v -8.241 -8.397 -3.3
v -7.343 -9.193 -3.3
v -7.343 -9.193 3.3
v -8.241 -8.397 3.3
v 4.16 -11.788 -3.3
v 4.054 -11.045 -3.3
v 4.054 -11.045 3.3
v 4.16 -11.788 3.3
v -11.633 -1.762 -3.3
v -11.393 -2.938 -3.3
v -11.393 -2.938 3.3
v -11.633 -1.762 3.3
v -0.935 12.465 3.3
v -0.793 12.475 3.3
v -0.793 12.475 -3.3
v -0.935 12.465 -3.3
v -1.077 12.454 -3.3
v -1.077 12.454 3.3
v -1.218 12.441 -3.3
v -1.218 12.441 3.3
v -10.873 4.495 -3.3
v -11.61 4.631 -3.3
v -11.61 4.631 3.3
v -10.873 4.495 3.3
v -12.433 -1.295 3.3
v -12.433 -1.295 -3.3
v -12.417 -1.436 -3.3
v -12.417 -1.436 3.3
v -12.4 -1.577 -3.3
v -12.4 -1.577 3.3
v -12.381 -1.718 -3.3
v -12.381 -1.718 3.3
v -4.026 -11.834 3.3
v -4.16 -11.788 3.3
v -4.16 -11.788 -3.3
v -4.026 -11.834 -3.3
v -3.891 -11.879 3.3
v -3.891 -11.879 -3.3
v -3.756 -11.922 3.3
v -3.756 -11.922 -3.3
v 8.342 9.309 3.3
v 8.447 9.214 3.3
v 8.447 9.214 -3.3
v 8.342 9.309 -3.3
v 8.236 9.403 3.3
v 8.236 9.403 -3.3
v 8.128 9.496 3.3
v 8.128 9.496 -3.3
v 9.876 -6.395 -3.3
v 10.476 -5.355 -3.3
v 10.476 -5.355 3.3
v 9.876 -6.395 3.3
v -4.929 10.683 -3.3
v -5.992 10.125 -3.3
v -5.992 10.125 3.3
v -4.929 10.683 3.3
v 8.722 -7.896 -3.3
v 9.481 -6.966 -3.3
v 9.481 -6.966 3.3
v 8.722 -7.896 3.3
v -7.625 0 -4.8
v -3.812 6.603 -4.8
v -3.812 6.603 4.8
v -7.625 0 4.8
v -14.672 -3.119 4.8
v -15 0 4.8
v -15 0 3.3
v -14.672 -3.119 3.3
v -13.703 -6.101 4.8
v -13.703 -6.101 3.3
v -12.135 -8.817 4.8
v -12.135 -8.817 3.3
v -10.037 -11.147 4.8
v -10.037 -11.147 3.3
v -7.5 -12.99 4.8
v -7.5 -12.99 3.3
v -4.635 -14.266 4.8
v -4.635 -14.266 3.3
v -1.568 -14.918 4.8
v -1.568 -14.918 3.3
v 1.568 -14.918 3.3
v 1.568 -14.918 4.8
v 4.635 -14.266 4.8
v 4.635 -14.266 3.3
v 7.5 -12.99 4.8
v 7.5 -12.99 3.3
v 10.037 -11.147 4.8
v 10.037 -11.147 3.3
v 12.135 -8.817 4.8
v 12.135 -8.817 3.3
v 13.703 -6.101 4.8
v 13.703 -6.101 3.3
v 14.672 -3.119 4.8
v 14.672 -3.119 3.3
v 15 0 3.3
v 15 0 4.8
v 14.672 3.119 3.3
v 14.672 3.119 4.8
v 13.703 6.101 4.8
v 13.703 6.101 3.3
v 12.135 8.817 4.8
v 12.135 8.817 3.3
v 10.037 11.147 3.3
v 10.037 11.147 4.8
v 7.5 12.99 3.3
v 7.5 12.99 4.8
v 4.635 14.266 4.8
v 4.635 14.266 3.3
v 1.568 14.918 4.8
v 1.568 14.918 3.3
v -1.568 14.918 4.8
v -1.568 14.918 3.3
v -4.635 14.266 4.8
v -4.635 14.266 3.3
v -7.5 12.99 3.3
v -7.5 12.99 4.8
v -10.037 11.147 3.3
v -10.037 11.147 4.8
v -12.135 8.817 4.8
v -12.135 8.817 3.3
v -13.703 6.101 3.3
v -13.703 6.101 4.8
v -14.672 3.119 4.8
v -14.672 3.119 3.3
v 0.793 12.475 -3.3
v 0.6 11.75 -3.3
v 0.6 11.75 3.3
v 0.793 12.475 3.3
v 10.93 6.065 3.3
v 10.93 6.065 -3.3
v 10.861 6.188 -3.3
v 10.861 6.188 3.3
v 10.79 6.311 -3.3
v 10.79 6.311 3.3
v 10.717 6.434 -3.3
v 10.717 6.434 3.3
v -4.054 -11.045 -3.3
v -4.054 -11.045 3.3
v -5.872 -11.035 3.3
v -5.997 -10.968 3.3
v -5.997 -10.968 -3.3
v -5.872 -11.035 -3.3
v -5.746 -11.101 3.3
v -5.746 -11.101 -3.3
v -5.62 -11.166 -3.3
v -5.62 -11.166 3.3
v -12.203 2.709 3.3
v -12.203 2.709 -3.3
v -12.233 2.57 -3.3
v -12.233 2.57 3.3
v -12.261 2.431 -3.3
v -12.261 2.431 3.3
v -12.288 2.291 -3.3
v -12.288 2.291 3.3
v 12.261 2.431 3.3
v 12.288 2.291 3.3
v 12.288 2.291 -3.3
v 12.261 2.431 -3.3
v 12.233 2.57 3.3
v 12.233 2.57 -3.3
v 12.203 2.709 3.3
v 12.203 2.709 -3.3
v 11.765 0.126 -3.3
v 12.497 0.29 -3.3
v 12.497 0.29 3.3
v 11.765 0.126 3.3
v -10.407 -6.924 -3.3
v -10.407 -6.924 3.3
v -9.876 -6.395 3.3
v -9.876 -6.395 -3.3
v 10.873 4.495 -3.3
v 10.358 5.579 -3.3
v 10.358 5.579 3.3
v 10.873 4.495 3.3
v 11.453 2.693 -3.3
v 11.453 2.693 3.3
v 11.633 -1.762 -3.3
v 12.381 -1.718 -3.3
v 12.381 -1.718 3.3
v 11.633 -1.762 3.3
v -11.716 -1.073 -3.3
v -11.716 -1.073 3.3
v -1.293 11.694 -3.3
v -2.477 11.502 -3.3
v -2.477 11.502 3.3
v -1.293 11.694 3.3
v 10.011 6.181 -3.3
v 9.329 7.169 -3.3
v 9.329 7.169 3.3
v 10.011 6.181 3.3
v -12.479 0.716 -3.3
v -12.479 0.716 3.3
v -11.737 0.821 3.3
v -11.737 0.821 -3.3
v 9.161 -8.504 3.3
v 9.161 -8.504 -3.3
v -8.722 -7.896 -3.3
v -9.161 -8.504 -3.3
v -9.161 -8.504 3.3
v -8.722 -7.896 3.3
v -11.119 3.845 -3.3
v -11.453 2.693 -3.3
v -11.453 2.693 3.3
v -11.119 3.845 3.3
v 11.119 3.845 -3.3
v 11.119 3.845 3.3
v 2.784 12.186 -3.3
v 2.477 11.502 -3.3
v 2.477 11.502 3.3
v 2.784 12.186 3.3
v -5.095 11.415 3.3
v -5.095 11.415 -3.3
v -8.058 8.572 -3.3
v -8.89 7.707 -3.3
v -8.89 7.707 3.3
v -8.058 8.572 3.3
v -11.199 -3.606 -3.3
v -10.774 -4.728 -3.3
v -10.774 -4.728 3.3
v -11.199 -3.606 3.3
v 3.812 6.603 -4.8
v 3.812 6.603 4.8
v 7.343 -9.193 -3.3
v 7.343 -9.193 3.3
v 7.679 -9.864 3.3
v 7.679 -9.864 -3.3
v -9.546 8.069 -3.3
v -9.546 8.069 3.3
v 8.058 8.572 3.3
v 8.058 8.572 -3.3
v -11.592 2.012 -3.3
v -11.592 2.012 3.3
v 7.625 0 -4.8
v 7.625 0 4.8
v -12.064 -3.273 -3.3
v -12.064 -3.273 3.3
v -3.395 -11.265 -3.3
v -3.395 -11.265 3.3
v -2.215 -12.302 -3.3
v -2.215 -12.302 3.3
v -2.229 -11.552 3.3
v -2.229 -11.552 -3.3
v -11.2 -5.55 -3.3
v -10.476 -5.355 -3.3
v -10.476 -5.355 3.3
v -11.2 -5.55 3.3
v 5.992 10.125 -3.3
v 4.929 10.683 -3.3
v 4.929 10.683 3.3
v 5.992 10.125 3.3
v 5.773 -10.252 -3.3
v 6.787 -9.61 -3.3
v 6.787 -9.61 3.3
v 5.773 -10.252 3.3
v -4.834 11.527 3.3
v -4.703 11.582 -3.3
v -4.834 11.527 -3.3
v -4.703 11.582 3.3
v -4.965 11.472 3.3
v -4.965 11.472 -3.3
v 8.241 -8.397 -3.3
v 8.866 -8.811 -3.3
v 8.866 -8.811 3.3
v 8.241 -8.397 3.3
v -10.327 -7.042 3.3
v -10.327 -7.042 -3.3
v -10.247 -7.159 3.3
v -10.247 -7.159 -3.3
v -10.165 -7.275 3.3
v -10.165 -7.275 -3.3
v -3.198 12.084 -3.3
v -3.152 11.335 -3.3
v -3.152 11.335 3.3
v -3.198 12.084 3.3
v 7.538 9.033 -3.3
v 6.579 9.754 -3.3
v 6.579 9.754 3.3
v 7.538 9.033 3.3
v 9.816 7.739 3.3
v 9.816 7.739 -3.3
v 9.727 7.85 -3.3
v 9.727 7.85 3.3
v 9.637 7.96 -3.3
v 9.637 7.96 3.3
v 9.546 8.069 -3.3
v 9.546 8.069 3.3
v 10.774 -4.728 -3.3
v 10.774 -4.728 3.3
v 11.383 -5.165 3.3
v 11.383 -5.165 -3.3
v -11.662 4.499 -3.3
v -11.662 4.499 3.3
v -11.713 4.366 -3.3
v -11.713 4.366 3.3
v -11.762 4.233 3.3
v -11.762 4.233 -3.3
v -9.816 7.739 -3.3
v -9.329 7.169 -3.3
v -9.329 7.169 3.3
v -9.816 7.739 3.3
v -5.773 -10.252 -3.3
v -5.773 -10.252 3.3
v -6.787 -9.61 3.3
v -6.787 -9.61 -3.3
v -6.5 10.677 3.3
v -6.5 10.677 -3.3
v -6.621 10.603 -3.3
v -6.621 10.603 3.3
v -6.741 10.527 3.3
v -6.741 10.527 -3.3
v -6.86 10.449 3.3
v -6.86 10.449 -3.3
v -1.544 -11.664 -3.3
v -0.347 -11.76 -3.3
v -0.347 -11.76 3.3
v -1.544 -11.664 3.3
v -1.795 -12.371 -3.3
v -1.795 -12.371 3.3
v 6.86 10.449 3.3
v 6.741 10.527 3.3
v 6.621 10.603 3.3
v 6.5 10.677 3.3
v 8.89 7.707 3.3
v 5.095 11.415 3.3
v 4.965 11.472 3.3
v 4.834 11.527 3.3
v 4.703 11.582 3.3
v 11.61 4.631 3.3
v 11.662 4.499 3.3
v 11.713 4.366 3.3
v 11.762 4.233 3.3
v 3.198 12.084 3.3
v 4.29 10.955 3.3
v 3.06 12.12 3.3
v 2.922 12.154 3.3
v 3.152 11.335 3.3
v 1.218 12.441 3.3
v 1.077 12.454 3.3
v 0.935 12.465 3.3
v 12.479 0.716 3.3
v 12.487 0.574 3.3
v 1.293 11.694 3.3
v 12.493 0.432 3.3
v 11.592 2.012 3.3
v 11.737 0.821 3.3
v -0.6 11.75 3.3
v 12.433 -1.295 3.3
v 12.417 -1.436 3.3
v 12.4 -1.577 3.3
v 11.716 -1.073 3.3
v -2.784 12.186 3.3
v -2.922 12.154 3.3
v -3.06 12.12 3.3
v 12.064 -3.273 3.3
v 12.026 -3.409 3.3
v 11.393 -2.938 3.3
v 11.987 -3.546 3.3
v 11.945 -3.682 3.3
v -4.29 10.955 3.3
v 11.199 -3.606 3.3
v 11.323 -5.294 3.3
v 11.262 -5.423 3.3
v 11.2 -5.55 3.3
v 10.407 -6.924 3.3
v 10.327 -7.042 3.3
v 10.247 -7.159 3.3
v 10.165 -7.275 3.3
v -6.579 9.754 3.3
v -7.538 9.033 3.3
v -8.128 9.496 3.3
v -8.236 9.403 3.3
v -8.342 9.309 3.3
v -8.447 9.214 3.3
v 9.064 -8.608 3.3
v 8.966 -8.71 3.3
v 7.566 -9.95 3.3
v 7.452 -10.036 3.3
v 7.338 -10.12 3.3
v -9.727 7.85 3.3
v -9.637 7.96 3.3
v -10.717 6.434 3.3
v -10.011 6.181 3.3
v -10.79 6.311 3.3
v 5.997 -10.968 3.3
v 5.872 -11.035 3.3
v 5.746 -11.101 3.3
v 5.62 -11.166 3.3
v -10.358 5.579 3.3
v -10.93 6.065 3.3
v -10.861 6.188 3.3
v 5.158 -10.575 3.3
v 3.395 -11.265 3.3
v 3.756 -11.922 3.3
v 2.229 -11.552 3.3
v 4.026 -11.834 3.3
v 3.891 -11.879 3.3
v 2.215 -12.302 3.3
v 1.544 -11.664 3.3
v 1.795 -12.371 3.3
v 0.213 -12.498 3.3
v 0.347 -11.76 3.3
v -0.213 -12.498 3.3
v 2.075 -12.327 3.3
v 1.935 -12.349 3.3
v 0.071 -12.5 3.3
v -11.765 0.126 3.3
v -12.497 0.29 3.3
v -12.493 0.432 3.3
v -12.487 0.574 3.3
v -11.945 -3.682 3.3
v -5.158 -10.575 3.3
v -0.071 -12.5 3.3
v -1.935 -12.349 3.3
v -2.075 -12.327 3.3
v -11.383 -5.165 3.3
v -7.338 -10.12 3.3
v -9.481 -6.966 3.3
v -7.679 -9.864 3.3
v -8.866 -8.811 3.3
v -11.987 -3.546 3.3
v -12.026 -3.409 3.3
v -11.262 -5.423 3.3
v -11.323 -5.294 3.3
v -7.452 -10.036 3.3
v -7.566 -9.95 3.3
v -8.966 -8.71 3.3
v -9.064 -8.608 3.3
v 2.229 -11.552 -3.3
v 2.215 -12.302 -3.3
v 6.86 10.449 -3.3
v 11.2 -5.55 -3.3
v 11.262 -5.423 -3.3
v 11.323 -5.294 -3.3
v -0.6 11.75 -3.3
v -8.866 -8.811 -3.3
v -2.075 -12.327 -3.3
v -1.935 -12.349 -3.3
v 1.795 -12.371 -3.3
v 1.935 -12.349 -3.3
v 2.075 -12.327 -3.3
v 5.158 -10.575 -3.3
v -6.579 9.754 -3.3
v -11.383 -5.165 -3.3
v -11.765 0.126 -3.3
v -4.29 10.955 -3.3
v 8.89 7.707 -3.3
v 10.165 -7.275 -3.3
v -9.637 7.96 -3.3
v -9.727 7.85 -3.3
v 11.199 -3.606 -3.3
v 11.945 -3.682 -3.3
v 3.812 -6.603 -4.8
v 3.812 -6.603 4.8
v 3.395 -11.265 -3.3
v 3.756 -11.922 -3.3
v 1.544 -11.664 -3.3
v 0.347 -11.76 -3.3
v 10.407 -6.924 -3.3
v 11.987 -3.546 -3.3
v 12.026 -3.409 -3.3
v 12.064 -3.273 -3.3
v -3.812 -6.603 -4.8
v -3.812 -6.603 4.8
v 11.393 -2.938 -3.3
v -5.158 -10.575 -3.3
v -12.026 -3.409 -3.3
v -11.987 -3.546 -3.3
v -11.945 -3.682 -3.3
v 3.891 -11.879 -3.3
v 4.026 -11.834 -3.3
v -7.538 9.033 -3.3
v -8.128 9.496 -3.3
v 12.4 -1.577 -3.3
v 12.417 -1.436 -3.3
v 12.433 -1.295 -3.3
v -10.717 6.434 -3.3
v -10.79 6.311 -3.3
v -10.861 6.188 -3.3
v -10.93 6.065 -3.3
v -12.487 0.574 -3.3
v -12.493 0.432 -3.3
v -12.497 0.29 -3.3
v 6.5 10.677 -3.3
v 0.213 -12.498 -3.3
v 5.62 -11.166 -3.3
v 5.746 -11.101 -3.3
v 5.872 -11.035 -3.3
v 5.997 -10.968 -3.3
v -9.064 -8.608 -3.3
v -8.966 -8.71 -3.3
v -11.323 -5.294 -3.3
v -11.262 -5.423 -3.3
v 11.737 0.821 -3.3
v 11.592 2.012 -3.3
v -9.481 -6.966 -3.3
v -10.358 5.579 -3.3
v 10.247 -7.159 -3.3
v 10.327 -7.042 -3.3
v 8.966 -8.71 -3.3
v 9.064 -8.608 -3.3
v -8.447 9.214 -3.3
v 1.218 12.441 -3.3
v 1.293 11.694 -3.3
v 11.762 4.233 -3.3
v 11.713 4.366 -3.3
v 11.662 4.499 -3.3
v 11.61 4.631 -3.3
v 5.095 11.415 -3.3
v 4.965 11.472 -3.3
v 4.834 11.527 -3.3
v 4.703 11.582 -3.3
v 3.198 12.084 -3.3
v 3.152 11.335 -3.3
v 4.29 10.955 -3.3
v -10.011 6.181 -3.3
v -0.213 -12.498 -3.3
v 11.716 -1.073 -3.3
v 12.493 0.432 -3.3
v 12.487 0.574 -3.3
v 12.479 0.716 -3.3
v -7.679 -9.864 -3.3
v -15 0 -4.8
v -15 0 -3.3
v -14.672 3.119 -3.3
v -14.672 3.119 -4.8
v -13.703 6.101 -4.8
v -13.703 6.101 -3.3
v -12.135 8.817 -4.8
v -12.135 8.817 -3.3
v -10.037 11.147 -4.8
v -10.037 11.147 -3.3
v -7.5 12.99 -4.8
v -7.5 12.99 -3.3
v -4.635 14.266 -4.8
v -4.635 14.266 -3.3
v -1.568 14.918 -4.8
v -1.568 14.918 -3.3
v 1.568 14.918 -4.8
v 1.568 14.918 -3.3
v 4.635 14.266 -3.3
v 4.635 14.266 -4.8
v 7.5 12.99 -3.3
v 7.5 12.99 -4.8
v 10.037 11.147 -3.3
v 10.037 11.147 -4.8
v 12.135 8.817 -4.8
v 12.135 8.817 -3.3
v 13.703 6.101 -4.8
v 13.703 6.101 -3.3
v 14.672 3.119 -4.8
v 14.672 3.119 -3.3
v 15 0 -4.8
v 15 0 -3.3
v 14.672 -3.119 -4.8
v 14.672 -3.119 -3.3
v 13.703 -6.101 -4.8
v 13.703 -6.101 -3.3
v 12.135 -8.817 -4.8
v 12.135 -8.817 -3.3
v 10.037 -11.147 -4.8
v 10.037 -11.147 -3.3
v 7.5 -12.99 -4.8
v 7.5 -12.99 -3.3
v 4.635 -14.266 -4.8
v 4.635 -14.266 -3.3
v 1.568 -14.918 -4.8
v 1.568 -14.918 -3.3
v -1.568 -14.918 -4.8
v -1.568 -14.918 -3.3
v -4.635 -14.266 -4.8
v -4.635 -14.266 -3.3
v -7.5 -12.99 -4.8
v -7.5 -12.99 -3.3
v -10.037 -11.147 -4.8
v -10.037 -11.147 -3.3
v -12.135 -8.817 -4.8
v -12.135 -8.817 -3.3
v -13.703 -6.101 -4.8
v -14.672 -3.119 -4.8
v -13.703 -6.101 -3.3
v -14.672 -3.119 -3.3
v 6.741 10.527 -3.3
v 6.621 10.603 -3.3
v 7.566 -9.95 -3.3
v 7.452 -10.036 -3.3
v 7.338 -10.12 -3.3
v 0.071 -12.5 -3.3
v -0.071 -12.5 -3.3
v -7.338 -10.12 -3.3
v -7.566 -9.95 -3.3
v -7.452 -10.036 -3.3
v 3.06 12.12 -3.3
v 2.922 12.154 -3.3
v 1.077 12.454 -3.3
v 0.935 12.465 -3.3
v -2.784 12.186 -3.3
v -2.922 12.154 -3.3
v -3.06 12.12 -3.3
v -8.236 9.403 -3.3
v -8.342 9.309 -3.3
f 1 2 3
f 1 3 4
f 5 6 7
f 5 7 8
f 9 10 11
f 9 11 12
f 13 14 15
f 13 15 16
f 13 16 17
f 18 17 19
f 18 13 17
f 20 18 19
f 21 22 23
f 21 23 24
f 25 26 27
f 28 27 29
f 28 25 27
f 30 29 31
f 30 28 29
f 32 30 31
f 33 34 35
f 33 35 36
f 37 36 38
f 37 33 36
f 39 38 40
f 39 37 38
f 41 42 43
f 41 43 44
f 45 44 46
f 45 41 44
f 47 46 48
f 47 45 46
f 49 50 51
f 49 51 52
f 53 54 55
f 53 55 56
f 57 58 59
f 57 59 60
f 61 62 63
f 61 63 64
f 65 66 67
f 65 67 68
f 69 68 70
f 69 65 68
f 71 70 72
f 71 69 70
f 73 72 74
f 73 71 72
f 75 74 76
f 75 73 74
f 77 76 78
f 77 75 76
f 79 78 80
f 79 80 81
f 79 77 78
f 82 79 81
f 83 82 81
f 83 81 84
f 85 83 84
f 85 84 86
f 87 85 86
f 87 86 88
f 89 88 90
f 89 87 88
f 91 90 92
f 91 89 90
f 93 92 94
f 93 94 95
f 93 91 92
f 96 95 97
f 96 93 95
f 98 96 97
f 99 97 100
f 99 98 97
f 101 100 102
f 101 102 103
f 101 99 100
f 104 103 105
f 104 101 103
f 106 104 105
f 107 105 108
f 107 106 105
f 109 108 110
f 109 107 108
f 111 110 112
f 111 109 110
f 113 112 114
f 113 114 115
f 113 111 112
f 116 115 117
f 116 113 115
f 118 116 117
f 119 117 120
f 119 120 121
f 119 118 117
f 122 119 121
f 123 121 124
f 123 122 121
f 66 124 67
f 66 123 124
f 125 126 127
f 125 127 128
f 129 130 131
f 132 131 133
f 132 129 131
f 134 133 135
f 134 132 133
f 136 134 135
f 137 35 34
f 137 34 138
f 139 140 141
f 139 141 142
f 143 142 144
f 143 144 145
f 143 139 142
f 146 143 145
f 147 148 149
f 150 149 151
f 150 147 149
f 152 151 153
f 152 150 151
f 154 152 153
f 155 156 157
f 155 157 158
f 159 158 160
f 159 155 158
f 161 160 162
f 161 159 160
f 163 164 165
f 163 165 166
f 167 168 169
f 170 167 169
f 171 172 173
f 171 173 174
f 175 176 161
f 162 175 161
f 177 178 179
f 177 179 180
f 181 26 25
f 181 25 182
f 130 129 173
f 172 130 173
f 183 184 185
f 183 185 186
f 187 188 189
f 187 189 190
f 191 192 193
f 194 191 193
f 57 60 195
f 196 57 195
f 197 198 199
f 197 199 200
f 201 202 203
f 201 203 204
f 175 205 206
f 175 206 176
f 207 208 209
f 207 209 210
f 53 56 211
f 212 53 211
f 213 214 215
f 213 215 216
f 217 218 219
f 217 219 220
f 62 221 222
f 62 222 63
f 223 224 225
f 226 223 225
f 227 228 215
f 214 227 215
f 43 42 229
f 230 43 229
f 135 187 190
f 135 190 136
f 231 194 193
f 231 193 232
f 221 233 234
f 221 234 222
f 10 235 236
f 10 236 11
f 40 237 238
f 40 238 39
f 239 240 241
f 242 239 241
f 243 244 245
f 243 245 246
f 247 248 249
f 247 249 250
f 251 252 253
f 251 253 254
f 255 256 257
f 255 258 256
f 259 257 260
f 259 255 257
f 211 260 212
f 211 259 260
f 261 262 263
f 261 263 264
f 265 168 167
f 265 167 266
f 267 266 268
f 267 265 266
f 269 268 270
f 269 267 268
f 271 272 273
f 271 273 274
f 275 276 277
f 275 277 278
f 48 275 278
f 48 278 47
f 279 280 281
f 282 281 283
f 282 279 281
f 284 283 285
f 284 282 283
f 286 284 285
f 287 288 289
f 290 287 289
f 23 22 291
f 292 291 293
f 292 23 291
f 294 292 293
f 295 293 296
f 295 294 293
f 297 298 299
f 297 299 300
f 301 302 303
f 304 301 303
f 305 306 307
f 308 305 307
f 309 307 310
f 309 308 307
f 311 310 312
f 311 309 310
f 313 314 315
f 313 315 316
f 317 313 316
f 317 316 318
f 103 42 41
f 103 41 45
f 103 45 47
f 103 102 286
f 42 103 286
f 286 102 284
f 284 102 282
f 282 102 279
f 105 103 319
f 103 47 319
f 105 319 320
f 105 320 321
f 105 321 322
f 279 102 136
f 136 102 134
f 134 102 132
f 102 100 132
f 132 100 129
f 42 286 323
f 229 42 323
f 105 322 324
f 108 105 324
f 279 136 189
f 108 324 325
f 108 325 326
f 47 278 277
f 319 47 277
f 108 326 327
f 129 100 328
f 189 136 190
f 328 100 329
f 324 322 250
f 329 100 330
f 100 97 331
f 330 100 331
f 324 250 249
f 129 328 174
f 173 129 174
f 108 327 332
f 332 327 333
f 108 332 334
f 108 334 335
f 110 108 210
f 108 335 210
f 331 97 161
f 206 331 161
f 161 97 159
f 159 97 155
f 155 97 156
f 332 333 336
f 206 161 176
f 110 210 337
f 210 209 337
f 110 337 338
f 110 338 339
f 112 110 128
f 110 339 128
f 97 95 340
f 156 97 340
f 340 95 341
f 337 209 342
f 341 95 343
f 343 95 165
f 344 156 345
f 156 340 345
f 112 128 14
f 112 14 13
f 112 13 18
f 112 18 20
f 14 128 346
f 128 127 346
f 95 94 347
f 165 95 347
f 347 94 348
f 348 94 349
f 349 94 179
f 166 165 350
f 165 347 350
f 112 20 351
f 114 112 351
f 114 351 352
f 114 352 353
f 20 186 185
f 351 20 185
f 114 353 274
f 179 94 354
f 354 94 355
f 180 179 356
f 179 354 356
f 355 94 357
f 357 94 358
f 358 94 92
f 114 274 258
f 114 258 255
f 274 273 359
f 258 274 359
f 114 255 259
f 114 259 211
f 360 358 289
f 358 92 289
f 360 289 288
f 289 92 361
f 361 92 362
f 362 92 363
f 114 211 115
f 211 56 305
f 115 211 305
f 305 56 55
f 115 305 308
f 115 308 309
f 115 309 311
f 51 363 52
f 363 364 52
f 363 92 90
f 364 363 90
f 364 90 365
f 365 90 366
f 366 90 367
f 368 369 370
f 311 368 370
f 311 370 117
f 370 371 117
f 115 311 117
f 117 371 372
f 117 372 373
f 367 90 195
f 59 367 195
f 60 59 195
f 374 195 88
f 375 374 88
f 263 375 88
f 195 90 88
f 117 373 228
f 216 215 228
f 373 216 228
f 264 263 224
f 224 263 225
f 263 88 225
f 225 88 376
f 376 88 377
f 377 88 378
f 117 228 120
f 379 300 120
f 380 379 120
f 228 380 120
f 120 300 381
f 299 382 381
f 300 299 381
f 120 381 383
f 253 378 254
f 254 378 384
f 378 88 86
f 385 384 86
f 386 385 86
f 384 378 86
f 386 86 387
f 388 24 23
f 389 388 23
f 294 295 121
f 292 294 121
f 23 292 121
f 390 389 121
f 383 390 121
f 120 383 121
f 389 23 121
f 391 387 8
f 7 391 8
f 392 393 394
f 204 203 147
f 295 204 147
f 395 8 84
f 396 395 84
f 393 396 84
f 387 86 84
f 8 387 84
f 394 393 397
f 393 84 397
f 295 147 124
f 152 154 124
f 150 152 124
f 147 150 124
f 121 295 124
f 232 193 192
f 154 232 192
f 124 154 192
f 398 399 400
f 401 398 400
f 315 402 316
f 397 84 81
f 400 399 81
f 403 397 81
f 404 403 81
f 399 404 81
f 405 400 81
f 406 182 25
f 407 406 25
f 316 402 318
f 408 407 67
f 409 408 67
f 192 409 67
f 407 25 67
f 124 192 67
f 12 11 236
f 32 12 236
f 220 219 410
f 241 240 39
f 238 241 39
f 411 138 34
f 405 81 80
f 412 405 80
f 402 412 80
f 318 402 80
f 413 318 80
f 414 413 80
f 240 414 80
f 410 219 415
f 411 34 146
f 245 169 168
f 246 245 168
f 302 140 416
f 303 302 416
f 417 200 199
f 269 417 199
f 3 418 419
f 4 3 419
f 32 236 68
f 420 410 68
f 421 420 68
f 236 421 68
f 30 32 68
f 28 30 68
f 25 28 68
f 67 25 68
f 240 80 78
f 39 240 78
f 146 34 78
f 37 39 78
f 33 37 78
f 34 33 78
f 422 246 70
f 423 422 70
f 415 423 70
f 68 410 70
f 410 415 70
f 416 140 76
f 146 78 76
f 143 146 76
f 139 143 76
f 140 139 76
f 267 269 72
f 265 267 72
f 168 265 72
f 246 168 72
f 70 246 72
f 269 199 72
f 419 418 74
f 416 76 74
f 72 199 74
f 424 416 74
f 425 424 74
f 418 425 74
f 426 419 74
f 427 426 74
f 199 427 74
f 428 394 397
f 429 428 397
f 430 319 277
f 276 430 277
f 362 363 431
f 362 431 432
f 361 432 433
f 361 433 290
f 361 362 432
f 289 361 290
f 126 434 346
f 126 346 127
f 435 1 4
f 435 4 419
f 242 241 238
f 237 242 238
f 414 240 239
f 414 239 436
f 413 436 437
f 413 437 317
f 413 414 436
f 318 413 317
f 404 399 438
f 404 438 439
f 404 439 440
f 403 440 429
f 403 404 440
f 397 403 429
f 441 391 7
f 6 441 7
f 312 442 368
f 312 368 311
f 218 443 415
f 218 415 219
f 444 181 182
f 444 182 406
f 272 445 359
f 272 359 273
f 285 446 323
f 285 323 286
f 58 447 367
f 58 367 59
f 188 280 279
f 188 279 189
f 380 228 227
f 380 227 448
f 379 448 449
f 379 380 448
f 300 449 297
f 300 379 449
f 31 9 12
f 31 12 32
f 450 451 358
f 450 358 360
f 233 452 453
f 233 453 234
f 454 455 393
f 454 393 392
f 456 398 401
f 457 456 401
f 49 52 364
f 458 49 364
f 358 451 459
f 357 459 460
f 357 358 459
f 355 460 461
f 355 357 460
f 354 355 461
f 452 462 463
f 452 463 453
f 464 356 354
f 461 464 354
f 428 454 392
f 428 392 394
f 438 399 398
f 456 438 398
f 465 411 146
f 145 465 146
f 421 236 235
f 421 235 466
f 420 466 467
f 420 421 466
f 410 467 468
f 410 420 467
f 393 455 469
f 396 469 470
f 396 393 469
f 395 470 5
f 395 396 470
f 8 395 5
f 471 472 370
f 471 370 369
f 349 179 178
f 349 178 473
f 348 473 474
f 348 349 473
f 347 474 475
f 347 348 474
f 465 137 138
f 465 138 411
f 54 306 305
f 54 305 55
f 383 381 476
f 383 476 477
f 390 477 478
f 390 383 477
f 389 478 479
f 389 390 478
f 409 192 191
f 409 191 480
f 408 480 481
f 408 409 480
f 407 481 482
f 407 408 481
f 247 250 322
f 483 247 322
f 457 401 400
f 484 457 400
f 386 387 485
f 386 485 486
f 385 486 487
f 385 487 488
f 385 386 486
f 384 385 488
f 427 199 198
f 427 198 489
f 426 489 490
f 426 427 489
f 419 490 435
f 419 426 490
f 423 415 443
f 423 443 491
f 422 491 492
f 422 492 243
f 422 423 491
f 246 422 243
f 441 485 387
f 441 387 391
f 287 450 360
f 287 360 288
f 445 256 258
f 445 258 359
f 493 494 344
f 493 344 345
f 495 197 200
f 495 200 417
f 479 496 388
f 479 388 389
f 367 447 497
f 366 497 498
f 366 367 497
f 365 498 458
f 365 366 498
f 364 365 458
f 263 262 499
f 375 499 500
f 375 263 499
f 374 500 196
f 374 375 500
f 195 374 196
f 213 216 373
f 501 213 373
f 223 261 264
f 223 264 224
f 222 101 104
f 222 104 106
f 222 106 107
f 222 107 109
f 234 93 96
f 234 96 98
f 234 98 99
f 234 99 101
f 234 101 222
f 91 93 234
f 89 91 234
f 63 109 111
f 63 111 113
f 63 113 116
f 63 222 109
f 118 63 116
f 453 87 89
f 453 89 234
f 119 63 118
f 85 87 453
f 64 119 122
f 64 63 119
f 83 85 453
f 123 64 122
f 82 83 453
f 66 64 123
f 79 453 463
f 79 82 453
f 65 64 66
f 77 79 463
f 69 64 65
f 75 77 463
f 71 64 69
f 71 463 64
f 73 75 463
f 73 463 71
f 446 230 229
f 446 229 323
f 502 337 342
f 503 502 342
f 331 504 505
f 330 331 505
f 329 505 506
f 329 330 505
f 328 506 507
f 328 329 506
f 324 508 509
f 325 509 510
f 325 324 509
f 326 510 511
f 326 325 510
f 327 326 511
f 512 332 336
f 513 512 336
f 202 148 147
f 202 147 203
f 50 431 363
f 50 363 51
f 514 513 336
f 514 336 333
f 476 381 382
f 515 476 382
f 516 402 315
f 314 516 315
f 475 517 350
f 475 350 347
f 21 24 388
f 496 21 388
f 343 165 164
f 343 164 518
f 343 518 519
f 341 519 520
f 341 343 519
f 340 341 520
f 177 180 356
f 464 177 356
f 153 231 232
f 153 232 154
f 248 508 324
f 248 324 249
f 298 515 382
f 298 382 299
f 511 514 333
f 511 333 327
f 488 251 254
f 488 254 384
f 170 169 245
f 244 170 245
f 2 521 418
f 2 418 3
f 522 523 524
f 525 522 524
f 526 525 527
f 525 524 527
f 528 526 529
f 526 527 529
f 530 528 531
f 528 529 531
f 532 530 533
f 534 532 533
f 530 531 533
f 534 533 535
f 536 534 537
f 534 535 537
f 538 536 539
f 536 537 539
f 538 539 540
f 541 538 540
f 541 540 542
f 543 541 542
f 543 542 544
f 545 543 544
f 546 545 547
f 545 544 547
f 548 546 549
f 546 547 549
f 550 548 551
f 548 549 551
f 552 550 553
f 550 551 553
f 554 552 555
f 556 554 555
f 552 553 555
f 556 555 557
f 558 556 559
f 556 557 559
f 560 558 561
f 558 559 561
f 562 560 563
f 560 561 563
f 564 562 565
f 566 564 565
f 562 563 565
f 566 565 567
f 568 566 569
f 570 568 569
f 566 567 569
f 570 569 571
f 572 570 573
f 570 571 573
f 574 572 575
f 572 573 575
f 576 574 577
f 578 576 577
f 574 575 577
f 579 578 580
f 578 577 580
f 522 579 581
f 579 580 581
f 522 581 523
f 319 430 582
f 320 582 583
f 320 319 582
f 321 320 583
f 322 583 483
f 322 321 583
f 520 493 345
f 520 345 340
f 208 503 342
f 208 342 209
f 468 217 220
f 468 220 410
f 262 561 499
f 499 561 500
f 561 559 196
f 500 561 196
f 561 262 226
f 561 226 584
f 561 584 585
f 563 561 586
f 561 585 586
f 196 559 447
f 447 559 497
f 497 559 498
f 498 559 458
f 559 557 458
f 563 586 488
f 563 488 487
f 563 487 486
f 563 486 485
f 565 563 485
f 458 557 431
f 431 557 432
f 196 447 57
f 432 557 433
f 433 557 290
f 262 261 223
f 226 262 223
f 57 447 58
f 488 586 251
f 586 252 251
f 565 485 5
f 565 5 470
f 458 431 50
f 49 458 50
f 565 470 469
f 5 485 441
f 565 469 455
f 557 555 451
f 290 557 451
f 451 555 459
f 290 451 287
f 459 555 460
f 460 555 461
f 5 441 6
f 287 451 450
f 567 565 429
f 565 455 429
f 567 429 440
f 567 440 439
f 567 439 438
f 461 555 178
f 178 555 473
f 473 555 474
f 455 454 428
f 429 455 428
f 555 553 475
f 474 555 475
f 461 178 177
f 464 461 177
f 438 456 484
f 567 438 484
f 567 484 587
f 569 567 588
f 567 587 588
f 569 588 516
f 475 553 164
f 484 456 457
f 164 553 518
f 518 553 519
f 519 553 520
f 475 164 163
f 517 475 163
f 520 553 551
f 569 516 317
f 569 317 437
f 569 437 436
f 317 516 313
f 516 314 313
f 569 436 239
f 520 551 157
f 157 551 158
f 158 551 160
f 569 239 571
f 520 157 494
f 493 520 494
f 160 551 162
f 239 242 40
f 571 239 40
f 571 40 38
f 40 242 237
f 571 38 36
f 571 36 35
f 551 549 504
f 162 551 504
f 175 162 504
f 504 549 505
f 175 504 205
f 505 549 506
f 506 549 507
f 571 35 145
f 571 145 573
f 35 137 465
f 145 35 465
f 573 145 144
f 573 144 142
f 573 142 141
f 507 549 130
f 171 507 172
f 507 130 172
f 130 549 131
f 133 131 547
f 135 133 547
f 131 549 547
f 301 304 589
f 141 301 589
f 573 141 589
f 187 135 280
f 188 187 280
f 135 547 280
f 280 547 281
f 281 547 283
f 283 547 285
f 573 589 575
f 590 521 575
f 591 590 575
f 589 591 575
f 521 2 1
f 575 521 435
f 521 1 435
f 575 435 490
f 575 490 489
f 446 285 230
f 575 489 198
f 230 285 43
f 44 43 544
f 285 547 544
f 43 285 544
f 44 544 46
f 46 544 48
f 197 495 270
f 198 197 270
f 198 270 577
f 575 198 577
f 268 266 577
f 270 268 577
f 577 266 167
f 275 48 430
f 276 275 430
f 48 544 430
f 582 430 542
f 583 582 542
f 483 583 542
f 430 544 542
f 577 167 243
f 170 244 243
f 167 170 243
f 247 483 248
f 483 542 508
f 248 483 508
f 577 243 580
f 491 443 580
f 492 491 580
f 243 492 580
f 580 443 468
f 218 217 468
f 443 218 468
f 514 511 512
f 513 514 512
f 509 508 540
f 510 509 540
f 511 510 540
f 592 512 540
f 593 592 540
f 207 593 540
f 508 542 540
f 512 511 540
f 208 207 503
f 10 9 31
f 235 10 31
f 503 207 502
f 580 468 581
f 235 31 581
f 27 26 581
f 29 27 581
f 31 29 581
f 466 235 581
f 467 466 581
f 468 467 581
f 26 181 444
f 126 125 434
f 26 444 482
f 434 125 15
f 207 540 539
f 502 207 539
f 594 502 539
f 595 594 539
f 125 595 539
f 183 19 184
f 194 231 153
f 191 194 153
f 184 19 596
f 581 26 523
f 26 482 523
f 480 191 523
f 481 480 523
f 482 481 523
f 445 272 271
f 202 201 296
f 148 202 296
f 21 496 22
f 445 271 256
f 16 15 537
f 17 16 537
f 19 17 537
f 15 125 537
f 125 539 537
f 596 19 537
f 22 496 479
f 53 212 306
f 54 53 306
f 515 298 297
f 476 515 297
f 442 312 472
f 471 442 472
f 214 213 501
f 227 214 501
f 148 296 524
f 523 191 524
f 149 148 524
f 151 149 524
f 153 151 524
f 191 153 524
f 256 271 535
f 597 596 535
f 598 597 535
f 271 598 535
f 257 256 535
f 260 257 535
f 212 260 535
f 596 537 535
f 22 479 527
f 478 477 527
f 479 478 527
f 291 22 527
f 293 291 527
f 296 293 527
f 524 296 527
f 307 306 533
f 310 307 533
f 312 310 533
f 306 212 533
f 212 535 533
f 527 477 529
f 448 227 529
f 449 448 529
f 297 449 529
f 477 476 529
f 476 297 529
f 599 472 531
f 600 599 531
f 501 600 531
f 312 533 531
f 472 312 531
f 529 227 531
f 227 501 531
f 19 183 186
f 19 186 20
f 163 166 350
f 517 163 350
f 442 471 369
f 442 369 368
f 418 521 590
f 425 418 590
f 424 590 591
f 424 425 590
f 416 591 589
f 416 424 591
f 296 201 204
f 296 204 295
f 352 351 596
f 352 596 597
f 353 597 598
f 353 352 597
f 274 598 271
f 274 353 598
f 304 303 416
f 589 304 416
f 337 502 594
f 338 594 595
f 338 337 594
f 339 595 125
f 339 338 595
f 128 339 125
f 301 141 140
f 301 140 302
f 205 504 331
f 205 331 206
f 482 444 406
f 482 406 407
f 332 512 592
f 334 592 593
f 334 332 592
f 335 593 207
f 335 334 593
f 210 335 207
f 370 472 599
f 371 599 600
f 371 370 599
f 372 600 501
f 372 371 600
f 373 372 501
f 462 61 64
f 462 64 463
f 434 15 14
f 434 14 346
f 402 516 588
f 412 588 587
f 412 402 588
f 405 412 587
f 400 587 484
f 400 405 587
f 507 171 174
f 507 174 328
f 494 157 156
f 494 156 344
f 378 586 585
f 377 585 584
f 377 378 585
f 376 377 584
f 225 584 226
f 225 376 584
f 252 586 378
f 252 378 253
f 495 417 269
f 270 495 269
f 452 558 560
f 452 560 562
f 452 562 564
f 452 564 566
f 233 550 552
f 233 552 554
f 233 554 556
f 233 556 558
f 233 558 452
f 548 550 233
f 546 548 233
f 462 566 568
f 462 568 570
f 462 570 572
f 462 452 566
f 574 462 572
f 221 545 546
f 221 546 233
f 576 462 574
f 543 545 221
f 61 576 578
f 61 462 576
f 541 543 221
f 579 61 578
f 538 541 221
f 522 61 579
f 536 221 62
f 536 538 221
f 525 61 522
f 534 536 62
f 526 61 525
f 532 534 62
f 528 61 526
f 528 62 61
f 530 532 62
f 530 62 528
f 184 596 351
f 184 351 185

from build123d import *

# Parameters (mm, degrees)
SKETCH1_R               = 12.5
BOSS_EXTRUDE1_DEPTH     = 3.3
CUT_EXTRUDE1_START      = -6.6
CUT_EXTRUDE1_DEPTH      = 26.469552194
CIRPATTERN2_COUNT       = 39
SKETCH2_R               = 15
BOSS_EXTRUDE3_DEPTH     = 1.5
BOSS_EXTRUDE4_START     = 1.5
SKETCH3_R               = 14.999999972
BOSS_EXTRUDE4_DEPTH     = 1.5
CUT_EXTRUDE2_DEPTH      = 24.284329494
CUT_EXTRUDE2_DEPTH_BACK = 24.284329494


with BuildPart() as part:
    # Sketch1 → Boss-Extrude1 (new, symmetric)
    with BuildSketch(Plane.XY):
        Circle(SKETCH1_R)
    extrude(amount=BOSS_EXTRUDE1_DEPTH, both=True)

    # Sketch4 → Cut-Extrude1 (cut)
    with BuildSketch(Plane.XY.offset(3.3).offset(CUT_EXTRUDE1_START)):
        Polygon((-0.6, 11.75), (0.6, 11.75), (0.8, 12.5), (-0.8, 12.5), align=None)
    cut_extrude1 = extrude(amount=CUT_EXTRUDE1_DEPTH, mode=Mode.SUBTRACT)

    # CirPattern2: Cut-Extrude1 ×39 about axis
    cirpattern2_axis = Axis((0, 0, 0), (0, 0, 1))
    for i in range(1, CIRPATTERN2_COUNT):
        add(cut_extrude1.rotate(cirpattern2_axis, i * 360 / CIRPATTERN2_COUNT), mode=Mode.SUBTRACT)

    # Sketch2 → Boss-Extrude3 (add)
    with BuildSketch(Plane(origin=(0, 0, -3.3), x_dir=(-1, 0, 0), z_dir=(0, 0, -1))):
        Circle(SKETCH2_R)
    extrude(amount=BOSS_EXTRUDE3_DEPTH)

    # Sketch3 → Boss-Extrude4 (add)
    with BuildSketch(Plane.XY.offset(3.3).offset(BOSS_EXTRUDE4_START)):
        with Locations(Location((0, 0, 0), (0, 0, 180))):
            Circle(SKETCH3_R)
    extrude(amount=-BOSS_EXTRUDE4_DEPTH)

    # Sketch5 → Cut-Extrude2 (cut, two sides: drawn at the far end of the back side and taken through both)
    with BuildSketch(Plane.XY.offset(4.8).offset(-CUT_EXTRUDE2_DEPTH_BACK)):
        Polygon((7.625, 0), (3.8125, 6.603443704), (-3.8125, 6.603443704), (-7.625, 0), (-3.8125, -6.603443704), (3.8125, -6.603443704), align=None)
    extrude(amount=CUT_EXTRUDE2_DEPTH + CUT_EXTRUDE2_DEPTH_BACK, mode=Mode.SUBTRACT)


solid = part.part
